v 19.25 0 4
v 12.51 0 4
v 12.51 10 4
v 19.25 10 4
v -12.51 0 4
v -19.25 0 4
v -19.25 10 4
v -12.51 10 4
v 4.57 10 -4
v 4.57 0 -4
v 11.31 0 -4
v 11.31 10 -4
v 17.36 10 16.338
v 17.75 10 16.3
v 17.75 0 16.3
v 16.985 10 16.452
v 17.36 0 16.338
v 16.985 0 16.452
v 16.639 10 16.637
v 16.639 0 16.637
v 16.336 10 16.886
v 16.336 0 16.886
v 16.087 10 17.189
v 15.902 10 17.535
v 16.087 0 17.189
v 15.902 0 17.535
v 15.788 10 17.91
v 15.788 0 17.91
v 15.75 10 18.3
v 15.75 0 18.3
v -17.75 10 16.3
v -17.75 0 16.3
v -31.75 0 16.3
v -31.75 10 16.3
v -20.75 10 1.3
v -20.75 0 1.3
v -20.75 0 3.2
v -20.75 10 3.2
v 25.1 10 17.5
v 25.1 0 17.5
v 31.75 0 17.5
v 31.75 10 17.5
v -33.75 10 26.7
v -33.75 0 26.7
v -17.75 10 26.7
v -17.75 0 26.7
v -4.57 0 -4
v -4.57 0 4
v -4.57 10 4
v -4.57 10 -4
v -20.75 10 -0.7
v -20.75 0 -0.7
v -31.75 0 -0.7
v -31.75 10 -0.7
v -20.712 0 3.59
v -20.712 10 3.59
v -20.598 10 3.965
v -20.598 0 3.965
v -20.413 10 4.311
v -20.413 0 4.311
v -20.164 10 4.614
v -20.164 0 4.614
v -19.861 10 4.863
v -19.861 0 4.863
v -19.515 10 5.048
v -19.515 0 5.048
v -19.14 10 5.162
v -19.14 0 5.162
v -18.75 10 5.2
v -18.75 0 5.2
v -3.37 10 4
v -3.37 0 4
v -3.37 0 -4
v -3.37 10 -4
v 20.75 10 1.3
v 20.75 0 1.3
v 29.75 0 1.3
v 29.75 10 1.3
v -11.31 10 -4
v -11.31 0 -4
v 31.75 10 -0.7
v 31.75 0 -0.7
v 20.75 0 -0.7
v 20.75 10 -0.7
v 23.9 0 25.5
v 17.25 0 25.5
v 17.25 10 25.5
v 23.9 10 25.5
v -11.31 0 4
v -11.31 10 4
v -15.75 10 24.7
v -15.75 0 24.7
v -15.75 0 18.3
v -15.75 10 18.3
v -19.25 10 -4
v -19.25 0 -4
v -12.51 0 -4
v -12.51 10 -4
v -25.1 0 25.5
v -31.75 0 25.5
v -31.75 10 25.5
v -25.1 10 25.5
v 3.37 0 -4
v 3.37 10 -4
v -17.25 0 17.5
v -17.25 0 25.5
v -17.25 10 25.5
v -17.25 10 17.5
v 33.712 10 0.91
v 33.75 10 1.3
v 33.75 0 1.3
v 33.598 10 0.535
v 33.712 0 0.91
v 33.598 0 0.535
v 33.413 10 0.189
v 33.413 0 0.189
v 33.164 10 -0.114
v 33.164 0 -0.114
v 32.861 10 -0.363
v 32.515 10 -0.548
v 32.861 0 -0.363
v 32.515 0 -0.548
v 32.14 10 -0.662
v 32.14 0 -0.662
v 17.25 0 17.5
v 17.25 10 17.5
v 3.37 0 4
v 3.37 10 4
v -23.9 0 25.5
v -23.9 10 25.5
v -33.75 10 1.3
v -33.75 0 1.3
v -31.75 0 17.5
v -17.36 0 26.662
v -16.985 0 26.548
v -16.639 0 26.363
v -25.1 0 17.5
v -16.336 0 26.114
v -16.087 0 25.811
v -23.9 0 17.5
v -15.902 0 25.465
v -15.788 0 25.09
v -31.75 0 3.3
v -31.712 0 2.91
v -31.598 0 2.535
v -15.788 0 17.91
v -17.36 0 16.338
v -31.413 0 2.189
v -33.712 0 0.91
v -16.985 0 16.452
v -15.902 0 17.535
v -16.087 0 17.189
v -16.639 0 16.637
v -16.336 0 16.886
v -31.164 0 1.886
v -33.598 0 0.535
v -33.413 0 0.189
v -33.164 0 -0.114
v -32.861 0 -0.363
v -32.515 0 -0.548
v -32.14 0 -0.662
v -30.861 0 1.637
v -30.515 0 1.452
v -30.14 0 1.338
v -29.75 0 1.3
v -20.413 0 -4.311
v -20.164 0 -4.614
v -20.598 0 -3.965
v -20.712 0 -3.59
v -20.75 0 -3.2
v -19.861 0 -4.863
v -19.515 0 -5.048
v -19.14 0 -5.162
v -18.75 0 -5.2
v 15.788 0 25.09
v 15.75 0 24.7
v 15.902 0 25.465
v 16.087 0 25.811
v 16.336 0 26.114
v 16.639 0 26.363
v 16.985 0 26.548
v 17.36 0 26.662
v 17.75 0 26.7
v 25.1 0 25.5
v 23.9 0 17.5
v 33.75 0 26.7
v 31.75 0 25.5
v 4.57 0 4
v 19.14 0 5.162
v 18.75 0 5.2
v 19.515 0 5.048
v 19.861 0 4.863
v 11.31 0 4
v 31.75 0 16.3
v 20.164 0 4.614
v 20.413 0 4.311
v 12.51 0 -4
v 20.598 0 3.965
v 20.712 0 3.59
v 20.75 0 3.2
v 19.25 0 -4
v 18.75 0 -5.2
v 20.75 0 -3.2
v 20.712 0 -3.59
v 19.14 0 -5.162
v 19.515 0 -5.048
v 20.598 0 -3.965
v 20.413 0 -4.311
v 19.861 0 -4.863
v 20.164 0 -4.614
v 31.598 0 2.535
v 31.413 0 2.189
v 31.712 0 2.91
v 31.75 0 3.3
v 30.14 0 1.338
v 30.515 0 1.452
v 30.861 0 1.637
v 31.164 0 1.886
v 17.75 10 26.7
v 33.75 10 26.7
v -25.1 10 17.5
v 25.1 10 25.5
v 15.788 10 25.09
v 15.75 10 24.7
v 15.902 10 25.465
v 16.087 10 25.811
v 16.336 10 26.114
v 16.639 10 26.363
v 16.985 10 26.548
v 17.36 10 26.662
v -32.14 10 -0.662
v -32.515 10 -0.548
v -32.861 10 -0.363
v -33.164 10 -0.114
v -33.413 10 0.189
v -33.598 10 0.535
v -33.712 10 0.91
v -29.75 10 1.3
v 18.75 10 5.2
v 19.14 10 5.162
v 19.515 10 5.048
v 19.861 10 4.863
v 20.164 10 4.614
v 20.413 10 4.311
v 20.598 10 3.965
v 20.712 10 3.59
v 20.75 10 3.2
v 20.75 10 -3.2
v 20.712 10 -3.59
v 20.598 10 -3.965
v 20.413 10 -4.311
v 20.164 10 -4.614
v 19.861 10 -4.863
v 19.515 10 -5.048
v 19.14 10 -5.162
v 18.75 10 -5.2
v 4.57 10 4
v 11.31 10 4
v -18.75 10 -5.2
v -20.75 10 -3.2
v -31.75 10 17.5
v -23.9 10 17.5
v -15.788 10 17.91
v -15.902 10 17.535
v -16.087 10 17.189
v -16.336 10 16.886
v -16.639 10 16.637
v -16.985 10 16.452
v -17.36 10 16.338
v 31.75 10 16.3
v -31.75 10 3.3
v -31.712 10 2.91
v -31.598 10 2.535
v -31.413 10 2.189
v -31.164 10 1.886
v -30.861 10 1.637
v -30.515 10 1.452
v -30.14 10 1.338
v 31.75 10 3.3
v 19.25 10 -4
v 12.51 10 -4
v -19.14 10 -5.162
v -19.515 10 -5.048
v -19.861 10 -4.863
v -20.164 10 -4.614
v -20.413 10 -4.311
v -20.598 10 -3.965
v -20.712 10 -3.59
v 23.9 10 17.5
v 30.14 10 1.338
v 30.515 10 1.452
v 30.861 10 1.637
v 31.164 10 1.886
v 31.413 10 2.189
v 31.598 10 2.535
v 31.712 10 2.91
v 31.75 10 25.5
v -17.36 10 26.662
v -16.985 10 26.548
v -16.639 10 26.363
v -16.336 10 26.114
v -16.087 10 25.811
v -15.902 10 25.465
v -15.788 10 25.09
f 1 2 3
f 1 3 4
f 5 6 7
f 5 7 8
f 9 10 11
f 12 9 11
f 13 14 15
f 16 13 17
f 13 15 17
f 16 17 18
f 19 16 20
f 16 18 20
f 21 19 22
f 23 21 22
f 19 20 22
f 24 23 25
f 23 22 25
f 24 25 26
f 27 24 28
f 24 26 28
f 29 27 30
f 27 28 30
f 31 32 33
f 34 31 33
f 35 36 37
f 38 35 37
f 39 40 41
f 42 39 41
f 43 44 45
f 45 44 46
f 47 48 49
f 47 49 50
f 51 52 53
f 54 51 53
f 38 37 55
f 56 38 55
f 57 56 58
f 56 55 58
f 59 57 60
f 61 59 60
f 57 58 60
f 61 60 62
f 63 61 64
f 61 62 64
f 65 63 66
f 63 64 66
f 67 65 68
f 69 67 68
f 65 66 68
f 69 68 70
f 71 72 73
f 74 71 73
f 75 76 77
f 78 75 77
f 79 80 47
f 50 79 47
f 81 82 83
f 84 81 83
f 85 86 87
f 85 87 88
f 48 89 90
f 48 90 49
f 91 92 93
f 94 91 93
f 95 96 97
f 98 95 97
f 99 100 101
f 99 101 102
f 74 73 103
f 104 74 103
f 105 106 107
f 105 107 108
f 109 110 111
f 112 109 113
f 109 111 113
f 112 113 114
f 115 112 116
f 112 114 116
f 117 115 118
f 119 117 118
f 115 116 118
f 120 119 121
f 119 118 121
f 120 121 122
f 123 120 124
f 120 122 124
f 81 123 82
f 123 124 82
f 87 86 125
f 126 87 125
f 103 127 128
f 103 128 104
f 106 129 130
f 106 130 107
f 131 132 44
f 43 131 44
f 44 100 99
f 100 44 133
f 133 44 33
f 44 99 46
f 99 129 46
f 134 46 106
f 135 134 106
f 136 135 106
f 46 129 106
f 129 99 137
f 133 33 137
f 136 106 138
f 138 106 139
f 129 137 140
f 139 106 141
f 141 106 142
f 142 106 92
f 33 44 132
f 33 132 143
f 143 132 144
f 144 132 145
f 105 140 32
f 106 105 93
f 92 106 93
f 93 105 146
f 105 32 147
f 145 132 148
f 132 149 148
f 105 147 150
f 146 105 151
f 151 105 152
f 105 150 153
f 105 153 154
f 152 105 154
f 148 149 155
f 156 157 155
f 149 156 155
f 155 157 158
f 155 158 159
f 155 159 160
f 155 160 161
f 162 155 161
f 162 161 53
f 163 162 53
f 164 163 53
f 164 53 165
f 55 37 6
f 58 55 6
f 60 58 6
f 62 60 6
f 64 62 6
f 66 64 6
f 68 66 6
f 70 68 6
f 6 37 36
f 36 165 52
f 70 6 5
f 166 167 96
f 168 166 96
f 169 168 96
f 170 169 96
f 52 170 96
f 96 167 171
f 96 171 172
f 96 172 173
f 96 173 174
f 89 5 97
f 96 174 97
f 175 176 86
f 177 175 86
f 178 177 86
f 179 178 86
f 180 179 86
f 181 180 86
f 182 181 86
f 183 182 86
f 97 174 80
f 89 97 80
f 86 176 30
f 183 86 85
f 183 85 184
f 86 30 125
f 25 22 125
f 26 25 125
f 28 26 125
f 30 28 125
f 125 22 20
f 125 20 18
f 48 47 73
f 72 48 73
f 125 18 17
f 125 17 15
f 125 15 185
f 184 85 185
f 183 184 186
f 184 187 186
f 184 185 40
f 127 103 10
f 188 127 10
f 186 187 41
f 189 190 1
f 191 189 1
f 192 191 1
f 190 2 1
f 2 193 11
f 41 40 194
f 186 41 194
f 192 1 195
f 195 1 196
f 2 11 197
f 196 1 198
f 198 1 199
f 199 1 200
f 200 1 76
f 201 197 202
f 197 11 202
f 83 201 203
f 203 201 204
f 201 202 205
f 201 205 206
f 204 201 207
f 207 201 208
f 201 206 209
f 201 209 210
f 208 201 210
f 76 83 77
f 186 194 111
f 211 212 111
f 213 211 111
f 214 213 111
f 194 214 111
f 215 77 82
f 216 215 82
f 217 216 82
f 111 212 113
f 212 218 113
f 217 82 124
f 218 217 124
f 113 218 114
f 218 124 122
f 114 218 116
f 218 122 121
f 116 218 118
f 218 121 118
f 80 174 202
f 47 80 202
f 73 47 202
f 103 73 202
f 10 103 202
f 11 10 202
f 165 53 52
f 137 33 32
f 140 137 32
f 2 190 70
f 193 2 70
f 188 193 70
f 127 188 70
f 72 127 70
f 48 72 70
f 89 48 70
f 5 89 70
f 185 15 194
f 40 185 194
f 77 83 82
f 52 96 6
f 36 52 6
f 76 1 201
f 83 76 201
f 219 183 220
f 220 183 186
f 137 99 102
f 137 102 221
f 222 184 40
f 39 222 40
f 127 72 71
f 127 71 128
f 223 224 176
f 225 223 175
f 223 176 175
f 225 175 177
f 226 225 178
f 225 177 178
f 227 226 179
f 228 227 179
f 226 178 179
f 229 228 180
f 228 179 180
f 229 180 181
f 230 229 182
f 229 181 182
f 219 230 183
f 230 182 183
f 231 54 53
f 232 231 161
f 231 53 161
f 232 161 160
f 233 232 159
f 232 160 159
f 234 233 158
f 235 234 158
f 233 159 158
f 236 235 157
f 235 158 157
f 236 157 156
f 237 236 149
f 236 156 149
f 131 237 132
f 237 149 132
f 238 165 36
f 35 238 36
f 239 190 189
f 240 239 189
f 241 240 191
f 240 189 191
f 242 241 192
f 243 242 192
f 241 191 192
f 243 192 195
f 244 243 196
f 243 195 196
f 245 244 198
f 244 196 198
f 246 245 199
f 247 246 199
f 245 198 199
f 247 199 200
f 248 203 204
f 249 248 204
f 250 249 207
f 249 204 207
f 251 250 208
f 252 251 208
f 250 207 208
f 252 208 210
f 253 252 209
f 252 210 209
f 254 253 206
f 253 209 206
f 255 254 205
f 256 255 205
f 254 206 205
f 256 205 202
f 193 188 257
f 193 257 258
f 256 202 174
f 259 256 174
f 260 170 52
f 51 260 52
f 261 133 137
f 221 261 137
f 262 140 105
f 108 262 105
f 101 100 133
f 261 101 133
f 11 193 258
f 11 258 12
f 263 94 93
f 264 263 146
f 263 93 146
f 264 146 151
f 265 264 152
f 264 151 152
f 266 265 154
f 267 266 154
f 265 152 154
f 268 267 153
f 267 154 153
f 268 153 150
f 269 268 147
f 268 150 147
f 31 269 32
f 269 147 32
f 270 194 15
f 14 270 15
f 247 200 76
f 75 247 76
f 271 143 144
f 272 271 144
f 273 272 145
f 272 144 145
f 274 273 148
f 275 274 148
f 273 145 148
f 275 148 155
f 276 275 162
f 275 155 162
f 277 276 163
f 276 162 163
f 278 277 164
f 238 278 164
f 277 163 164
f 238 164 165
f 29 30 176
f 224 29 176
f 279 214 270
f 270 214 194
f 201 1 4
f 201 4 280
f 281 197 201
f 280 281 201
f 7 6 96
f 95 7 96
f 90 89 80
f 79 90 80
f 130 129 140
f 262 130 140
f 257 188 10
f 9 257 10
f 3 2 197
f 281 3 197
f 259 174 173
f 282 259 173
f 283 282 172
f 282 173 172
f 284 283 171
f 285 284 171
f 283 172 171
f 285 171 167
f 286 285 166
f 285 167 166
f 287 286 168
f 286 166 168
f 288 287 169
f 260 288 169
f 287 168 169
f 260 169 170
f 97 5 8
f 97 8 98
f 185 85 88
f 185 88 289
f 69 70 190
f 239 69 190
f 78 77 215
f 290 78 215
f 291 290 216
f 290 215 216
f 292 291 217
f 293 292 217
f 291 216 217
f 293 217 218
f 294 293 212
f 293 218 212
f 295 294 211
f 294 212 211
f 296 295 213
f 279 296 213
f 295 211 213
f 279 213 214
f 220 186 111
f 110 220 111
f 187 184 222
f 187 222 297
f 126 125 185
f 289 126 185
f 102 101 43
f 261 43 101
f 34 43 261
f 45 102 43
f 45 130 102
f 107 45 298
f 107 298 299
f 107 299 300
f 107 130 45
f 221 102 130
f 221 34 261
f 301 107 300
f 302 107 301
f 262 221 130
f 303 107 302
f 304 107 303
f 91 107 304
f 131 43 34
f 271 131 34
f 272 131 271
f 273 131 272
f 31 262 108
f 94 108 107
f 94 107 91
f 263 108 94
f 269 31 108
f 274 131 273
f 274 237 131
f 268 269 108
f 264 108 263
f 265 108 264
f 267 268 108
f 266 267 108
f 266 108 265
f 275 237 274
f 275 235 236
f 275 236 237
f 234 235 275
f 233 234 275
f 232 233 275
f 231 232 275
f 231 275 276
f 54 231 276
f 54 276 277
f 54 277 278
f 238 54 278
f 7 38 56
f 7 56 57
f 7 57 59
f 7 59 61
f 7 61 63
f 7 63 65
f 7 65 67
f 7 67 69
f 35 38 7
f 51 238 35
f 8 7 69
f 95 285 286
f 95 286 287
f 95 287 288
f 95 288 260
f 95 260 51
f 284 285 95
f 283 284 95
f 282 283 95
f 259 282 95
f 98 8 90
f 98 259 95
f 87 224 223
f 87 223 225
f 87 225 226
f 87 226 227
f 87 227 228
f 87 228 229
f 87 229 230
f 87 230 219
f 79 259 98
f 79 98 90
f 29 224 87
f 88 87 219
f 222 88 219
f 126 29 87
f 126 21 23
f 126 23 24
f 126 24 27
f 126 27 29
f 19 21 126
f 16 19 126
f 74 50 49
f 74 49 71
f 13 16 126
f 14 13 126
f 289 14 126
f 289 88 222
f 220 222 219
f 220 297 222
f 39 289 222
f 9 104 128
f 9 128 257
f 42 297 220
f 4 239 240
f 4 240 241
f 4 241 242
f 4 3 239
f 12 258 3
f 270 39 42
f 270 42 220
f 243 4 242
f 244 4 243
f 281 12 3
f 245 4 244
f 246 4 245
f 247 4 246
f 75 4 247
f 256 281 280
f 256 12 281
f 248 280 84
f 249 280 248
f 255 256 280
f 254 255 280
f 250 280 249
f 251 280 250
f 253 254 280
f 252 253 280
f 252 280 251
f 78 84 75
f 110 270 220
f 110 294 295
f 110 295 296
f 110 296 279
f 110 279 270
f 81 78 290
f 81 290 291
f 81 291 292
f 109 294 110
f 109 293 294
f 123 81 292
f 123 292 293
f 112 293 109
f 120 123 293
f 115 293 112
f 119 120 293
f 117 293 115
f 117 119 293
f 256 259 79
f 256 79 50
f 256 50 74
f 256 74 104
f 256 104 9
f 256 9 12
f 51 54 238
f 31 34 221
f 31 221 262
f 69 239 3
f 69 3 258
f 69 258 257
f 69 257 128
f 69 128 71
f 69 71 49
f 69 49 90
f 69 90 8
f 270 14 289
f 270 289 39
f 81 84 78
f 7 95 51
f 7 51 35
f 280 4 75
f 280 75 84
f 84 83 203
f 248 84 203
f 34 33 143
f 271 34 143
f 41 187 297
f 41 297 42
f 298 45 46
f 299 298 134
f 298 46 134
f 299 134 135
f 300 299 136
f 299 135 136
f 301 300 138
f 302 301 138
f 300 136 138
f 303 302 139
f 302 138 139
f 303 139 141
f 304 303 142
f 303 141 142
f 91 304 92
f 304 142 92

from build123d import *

# Parameters (mm, degrees)
ESBO_O1_W                = 6.74
ESBO_O1_H                = 8
ESBO_O1_W_2              = 6.65
RESSALTO_EXTRUS_O1_DEPTH = 10


with BuildPart() as part:
    # Esboço1 → Ressalto-extrusão1 (new body)
    # profile 1 of 3: a face of its own
    with BuildSketch(Plane(origin=(0, 0, 0), x_dir=(1, 0, 0), z_dir=(0, 1, 0))):
        with BuildLine():
            Line((18.75, 5.2), (-18.75, 5.2))
            ThreePointArc((-18.75, 5.2), (-20.164213562, 4.614213562), (-20.75, 3.2))
            Line((-20.75, 3.2), (-20.75, 0.7))
            Line((-20.75, 0.7), (-20.75, -1.3))
            Line((-20.75, -1.3), (-20.75, -3.2))
            ThreePointArc((-20.75, -3.2), (-20.164213562, -4.614213562), (-18.75, -5.2))
            Line((-18.75, -5.2), (18.75, -5.2))
            ThreePointArc((18.75, -5.2), (20.164213562, -4.614213562), (20.75, -3.2))
            Line((20.75, -3.2), (20.75, -1.3))
            Line((20.75, -1.3), (20.75, 0.7))
            Line((20.75, 0.7), (20.75, 3.2))
            ThreePointArc((20.75, 3.2), (20.164213562, 4.614213562), (18.75, 5.2))
        make_face()
        with Locations((-15.88, 0)):
            Rectangle(ESBO_O1_W, ESBO_O1_H, mode=Mode.SUBTRACT)
        with Locations((-7.94, 0)):
            Rectangle(ESBO_O1_W, ESBO_O1_H, mode=Mode.SUBTRACT)
        Rectangle(ESBO_O1_W, ESBO_O1_H, mode=Mode.SUBTRACT)
        with Locations((7.94, 0)):
            Rectangle(ESBO_O1_W, ESBO_O1_H, mode=Mode.SUBTRACT)
        with Locations((15.88, 0)):
            Rectangle(ESBO_O1_W, ESBO_O1_H, mode=Mode.SUBTRACT)
    # profile 2 of 3: a face of its own
    with BuildSketch(Plane(origin=(0, 0, 0), x_dir=(1, 0, 0), z_dir=(0, 1, 0))):
        with BuildLine():
            Line((-20.75, -1.3), (-20.75, 0.7))
            Line((-20.75, 0.7), (-31.75, 0.7))
            ThreePointArc((-31.75, 0.7), (-33.164213562, 0.114213562), (-33.75, -1.3))
            Line((-33.75, -1.3), (-33.75, -14.642724204))
            Line((-33.75, -14.642724204), (-33.75, -16))
            Line((-33.75, -16), (-33.75, -16.3))
            Line((-33.75, -16.3), (-33.75, -17.5))
            Line((-33.75, -17.5), (-33.75, -25.5))
            Line((-33.75, -25.5), (-33.75, -26.7))
            Line((-33.75, -26.7), (-17.75, -26.7))
            ThreePointArc((-17.75, -26.7), (-16.335786438, -26.114213562), (-15.75, -24.7))
            Line((-15.75, -24.7), (-15.75, -18.3))
            ThreePointArc((-15.75, -18.3), (-16.335786438, -16.885786438), (-17.75, -16.3))
            Line((-17.75, -16.3), (-31.75, -16.3))
            Line((-31.75, -16.3), (-31.75, -16))
            Line((-31.75, -16), (-31.75, -3.3))
            ThreePointArc((-31.75, -3.3), (-31.164213562, -1.885786438), (-29.75, -1.3))
            Line((-29.75, -1.3), (-20.75, -1.3))
        make_face()
        with Locations((-28.425, -21.5)):
            Rectangle(ESBO_O1_W_2, ESBO_O1_H, mode=Mode.SUBTRACT)
        with Locations((-20.575, -21.5)):
            Rectangle(ESBO_O1_W_2, ESBO_O1_H, mode=Mode.SUBTRACT)
    # profile 3 of 3: a face of its own
    with BuildSketch(Plane(origin=(0, 0, 0), x_dir=(1, 0, 0), z_dir=(0, 1, 0))):
        with BuildLine():
            Line((31.75, 0.7), (20.75, 0.7))
            Line((20.75, 0.7), (20.75, -1.3))
            Line((20.75, -1.3), (29.75, -1.3))
            ThreePointArc((29.75, -1.3), (31.164213562, -1.885786438), (31.75, -3.3))
            Line((31.75, -3.3), (31.75, -16))
            Line((31.75, -16), (31.75, -16.3))
            Line((31.75, -16.3), (17.75, -16.3))
            ThreePointArc((17.75, -16.3), (16.335786438, -16.885786438), (15.75, -18.3))
            Line((15.75, -18.3), (15.75, -24.7))
            ThreePointArc((15.75, -24.7), (16.335786438, -26.114213562), (17.75, -26.7))
            Line((17.75, -26.7), (33.75, -26.7))
            Line((33.75, -26.7), (33.75, -25.5))
            Line((33.75, -25.5), (33.75, -17.5))
            Line((33.75, -17.5), (33.75, -16.3))
            Line((33.75, -16.3), (33.75, -16))
            Line((33.75, -16), (33.75, -14.642724204))
            Line((33.75, -14.642724204), (33.75, -1.3))
            ThreePointArc((33.75, -1.3), (33.164213562, 0.114213562), (31.75, 0.7))
        make_face()
        with Locations((20.575, -21.5)):
            Rectangle(ESBO_O1_W_2, ESBO_O1_H, mode=Mode.SUBTRACT)
        with Locations((28.425, -21.5)):
            Rectangle(ESBO_O1_W_2, ESBO_O1_H, mode=Mode.SUBTRACT)
    extrude(amount=RESSALTO_EXTRUS_O1_DEPTH)


solid = part.part
